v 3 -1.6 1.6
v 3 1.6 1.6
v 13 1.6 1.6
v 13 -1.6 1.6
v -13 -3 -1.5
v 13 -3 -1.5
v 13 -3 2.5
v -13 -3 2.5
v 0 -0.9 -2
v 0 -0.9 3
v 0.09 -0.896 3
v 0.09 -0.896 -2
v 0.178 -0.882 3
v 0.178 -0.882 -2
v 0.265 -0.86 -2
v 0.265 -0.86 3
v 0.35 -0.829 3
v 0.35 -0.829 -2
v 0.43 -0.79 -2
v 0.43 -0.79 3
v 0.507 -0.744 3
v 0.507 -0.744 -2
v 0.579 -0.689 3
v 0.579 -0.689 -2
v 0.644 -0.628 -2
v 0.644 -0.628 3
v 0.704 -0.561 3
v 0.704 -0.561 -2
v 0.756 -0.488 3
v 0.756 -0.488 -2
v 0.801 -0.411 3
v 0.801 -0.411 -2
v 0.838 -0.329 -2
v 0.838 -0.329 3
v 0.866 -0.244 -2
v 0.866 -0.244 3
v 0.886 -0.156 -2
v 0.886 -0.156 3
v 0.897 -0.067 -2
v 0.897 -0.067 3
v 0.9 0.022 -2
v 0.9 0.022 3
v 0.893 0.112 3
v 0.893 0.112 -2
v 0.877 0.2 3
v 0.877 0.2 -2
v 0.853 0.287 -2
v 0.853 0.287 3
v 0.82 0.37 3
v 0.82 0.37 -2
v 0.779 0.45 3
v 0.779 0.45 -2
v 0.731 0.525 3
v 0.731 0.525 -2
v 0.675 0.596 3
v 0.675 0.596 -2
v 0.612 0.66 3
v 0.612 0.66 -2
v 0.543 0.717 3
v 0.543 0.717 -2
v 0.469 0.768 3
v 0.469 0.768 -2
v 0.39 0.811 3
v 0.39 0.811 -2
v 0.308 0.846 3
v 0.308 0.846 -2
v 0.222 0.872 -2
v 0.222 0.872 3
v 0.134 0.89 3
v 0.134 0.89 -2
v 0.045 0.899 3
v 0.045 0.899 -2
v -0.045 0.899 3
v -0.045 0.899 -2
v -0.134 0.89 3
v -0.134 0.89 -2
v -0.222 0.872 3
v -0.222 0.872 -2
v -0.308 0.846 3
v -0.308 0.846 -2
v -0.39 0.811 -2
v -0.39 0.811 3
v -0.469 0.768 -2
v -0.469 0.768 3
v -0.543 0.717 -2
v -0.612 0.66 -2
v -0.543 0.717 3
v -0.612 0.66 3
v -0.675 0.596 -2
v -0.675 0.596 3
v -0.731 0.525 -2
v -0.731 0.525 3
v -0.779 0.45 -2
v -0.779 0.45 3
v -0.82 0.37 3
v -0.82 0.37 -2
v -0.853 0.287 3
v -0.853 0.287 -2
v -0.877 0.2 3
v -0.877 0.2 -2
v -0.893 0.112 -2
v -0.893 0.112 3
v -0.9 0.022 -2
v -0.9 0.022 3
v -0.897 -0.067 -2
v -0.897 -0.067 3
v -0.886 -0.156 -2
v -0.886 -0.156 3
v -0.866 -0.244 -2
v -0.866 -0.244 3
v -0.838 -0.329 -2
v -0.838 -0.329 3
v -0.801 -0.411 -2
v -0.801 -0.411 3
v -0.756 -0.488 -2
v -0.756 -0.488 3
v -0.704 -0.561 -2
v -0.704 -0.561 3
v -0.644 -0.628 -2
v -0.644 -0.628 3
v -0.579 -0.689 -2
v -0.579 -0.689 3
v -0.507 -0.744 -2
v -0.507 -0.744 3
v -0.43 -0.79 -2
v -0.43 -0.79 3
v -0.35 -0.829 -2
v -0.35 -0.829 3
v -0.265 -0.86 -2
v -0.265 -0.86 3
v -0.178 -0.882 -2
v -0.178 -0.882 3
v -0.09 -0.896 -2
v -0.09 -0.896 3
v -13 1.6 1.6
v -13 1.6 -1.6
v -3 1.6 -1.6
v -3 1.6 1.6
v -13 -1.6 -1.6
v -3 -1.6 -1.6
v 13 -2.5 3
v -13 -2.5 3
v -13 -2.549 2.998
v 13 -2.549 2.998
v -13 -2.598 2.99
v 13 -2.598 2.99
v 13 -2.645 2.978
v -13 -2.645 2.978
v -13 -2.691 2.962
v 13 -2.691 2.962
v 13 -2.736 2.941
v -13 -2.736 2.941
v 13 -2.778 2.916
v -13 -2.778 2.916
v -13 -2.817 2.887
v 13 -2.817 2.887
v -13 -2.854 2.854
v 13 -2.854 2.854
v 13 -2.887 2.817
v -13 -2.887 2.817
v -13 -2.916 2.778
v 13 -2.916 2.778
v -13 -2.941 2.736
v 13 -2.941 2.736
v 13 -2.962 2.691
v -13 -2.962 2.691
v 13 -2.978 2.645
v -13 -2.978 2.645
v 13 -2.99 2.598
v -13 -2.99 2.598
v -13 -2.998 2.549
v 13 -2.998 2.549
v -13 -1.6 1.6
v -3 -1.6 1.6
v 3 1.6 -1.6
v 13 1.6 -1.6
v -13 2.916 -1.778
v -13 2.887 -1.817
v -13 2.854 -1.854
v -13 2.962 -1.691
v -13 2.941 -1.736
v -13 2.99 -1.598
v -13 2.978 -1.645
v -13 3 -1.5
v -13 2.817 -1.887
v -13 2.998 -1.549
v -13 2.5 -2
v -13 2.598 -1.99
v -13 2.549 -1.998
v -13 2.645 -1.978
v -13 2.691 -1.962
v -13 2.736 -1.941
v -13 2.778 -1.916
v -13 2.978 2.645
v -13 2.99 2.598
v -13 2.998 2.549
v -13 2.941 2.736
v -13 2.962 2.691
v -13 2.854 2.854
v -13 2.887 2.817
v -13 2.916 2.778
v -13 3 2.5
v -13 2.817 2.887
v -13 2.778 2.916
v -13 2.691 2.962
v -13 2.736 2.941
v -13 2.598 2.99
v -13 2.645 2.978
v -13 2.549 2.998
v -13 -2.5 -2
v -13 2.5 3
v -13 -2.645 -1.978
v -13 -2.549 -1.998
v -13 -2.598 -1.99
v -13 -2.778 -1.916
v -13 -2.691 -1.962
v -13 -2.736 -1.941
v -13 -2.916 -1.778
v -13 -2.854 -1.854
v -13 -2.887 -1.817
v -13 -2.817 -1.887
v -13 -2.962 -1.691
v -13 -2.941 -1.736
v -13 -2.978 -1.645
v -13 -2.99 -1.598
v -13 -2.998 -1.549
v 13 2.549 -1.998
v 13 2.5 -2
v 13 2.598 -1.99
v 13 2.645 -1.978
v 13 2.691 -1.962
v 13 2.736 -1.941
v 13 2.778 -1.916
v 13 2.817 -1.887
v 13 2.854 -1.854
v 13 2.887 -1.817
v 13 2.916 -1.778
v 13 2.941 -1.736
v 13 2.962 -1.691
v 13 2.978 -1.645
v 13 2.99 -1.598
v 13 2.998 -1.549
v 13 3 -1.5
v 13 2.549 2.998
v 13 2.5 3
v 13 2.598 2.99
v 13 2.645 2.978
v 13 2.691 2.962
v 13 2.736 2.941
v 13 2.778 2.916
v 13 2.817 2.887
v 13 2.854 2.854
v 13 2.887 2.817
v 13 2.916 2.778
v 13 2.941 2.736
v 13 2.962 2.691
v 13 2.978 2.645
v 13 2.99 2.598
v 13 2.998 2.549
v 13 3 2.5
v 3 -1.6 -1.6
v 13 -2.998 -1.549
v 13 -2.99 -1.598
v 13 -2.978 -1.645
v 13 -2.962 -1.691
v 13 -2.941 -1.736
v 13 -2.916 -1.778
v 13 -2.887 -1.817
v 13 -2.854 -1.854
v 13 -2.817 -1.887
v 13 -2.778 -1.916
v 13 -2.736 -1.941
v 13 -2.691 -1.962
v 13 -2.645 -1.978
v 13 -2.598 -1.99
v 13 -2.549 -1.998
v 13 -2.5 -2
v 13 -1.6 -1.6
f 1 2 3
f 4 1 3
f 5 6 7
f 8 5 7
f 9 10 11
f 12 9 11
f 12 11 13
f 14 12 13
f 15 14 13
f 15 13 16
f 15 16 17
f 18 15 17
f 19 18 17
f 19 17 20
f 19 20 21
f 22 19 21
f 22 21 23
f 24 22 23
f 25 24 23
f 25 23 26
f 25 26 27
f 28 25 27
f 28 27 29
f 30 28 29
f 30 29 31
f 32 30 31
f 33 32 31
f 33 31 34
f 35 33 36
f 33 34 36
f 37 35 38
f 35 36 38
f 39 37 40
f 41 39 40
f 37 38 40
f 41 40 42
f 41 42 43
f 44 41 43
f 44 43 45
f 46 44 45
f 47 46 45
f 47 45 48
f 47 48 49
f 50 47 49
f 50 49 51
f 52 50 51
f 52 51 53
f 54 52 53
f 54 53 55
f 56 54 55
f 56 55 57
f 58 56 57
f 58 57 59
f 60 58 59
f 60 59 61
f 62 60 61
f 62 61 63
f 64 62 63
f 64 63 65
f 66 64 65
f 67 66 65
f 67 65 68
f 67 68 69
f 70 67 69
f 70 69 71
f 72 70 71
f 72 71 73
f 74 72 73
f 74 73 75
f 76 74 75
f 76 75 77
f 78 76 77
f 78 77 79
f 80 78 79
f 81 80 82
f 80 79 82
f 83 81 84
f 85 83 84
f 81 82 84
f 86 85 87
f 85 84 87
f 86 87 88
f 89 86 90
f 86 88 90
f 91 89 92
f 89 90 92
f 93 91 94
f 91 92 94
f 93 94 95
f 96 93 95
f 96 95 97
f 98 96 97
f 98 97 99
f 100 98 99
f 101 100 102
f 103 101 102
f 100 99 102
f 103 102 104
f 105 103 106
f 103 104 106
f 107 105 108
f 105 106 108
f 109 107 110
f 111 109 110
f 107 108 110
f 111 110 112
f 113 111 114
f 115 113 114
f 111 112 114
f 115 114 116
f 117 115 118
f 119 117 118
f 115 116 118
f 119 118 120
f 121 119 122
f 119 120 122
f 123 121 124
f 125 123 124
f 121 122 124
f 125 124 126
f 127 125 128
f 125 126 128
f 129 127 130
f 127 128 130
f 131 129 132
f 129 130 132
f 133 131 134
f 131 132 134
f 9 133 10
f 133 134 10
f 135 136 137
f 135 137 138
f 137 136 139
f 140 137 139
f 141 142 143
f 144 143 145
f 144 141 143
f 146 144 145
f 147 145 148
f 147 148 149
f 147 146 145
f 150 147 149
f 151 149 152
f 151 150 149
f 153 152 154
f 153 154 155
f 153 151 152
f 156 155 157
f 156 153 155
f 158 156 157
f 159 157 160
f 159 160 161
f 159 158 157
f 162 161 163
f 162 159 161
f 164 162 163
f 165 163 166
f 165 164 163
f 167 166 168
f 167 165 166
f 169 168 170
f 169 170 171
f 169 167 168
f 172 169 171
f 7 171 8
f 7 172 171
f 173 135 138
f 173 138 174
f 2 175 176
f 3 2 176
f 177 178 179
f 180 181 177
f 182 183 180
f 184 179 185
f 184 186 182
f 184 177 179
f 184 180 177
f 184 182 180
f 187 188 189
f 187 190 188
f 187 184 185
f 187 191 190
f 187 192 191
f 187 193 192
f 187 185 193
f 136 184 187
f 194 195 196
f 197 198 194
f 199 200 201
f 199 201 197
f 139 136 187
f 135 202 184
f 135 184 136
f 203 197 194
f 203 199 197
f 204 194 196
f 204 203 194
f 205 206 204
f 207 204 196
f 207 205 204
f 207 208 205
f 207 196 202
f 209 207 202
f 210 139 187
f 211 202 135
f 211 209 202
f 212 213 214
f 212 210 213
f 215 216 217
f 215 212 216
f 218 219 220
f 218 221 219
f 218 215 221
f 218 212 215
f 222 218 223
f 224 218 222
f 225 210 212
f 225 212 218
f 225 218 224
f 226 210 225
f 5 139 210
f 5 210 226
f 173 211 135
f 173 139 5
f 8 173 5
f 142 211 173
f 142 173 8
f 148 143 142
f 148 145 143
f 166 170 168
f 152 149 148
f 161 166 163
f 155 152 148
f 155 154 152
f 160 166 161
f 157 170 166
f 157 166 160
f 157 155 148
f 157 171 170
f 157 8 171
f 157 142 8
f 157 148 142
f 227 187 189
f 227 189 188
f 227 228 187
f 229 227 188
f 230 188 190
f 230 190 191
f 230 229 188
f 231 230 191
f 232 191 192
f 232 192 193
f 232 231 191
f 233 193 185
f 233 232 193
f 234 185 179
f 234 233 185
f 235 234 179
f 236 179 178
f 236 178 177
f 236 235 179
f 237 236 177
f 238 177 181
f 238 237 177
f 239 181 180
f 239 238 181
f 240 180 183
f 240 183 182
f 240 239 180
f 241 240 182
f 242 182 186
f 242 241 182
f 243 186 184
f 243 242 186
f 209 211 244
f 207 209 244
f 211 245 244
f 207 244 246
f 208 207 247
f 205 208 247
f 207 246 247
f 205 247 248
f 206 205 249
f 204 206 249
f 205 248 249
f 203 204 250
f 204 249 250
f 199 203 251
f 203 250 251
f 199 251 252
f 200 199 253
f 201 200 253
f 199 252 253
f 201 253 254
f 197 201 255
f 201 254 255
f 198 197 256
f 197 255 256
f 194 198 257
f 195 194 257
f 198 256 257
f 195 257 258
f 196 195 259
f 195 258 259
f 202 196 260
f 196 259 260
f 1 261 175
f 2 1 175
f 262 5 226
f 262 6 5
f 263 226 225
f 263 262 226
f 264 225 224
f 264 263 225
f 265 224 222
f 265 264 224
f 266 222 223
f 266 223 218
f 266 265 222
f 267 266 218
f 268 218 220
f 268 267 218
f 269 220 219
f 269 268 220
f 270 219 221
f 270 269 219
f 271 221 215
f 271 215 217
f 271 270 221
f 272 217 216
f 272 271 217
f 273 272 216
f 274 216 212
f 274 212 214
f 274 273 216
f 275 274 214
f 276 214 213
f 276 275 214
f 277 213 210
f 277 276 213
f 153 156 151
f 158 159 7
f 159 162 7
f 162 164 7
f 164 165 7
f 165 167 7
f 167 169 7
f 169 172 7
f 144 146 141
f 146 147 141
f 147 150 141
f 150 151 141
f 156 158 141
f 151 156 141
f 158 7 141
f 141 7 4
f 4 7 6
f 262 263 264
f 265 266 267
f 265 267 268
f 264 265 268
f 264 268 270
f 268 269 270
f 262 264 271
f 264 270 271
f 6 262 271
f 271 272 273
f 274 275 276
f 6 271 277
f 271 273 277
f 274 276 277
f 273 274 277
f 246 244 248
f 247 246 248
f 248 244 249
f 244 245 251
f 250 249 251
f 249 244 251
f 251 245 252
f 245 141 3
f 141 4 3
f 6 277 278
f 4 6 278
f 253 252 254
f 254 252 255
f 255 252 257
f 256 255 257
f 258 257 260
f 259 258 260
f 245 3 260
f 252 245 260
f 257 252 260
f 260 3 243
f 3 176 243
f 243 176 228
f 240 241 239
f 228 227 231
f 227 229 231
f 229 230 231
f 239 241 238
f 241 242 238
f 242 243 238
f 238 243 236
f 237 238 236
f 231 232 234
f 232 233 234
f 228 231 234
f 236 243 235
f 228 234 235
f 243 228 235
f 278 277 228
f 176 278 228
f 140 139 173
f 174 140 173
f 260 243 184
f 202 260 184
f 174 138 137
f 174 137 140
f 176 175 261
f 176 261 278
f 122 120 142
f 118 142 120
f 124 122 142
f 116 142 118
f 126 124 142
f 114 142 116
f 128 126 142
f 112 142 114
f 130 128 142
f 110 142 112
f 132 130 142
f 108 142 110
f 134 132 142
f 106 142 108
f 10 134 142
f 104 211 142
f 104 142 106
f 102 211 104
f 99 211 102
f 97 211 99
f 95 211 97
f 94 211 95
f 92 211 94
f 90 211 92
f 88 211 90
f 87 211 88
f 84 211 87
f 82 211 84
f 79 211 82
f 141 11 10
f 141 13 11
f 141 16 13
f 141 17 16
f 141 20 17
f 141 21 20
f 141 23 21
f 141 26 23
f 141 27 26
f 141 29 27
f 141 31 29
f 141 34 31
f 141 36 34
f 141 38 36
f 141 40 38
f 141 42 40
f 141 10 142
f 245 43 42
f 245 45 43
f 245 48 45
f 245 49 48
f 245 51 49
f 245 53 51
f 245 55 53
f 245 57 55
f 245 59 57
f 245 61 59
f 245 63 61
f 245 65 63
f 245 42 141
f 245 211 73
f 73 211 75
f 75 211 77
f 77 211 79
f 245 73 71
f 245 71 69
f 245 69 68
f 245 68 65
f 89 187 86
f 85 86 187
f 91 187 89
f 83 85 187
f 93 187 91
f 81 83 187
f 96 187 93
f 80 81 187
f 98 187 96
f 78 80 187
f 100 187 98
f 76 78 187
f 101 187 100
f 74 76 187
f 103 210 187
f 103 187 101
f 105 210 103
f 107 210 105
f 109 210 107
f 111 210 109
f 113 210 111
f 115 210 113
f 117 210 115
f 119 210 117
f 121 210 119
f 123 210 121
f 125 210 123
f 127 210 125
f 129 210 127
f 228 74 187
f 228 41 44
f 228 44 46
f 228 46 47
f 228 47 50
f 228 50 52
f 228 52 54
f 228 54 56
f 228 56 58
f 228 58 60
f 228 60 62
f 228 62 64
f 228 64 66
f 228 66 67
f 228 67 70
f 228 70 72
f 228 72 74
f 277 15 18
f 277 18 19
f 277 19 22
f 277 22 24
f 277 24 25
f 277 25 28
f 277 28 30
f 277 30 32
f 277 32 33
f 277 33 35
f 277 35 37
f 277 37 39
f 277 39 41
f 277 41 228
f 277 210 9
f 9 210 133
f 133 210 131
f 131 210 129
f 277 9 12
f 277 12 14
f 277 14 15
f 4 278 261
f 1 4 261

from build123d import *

# Parameters (mm, degrees)
SKETCH3_R             = 3
BOSS_EXTRUDE1_DEPTH   = 6
BOSS_EXTRUDE2_START   = -3
SKETCH4_W             = 6
SKETCH4_H             = 6
BOSS_EXTRUDE2_DEPTH   = 13
SKETCH5_W             = 3.2
SKETCH5_H             = 3.2
CUT_EXTRUDE1_DEPTH    = 10
SKETCH6_R             = 0.9
CUT_EXTRUDE2_DEPTH    = 15.628738838
MIRROR2_DEPTH         = 6
MIRROR2_2_OUTLINE_W   = 10
MIRROR2_2_OUTLINE_H   = 3.2
MIRROR2_2_DEPTH       = 1.4
MIRROR2_START         = 4.6
MIRROR2_3_OUTLINE_W   = 10
MIRROR2_3_OUTLINE_H   = 3.2
MIRROR2_3_DEPTH       = 1.4
SKETCH8_W             = 26
SKETCH8_H             = 6
CUT_EXTRUDE3_DEPTH    = 1
FILLET1_R             = 0.5
BODY_MOVE_COPY1_ANGLE = 90


with BuildPart() as part:
    # Sketch3 → Boss-Extrude1 (new body)
    with BuildSketch(Plane(origin=(0, 0, 0), x_dir=(1, 0, 0), z_dir=(0, 1, 0))):
        with Locations(Location((0, 0, 0), (0, 0, 270))):
            Circle(SKETCH3_R)
    extrude(amount=BOSS_EXTRUDE1_DEPTH)

    # Sketch4 → Boss-Extrude2 (add)
    with BuildSketch(Plane.ZY.offset(3).offset(BOSS_EXTRUDE2_START)):
        with Locations((0, 3)):
            Rectangle(SKETCH4_W, SKETCH4_H)
    extrude(amount=BOSS_EXTRUDE2_DEPTH)

    # Sketch5 → Cut-Extrude1 (cut)
    with BuildSketch(Plane.ZY.offset(13)):
        with Locations((0, 3)):
            Rectangle(SKETCH5_W, SKETCH5_H)
    extrude(amount=-CUT_EXTRUDE1_DEPTH, mode=Mode.SUBTRACT)

    # Sketch6 → Cut-Extrude2 (cut, through all)
    with BuildSketch(Plane(origin=(0, 6, 0), x_dir=(1, 0, 0), z_dir=(0, 1, 0))):
        with Locations(Location((0, 0, 0), (0, 0, 270))):
            Circle(SKETCH6_R)
    extrude(amount=-CUT_EXTRUDE2_DEPTH, mode=Mode.SUBTRACT)

    # Mirror2: read off the stored shape, not the designer's step
    # Mirror2 outline → Mirror2 (add)
    with BuildSketch(Plane(origin=(0, 0, 0), x_dir=(1, 0, 0), z_dir=(0, 1, 0))):
        with BuildLine():
            Line((13, 1.6), (13, 3))
            Line((13, 3), (0, 3))
            ThreePointArc((0, 3), (2.121320344, 2.121320344), (3, 0))
            Line((3, 0), (3, 1.6))
            Line((3, 1.6), (13, 1.6))
        make_face()
        with BuildLine():
            Line((13, -3), (13, -1.6))
            Line((13, -1.6), (3, -1.6))
            Line((3, -1.6), (3, 0))
            ThreePointArc((3, 0), (2.121320344, -2.121320344), (0, -3))
            Line((0, -3), (13, -3))
        make_face()
    extrude(amount=MIRROR2_DEPTH)

    # Mirror2 2 outline → Mirror2 2 (add)
    with BuildSketch(Plane(origin=(0, 0, 0), x_dir=(1, 0, 0), z_dir=(0, 1, 0))):
        with Locations((8, 0)):
            Rectangle(MIRROR2_2_OUTLINE_W, MIRROR2_2_OUTLINE_H)
    extrude(amount=MIRROR2_2_DEPTH)

    # Mirror2 3 outline → Mirror2 3 (add)
    with BuildSketch(Plane(origin=(0, 0, 0), x_dir=(1, 0, 0), z_dir=(0, 1, 0)).offset(MIRROR2_START)):
        with Locations((8, 0)):
            Rectangle(MIRROR2_3_OUTLINE_W, MIRROR2_3_OUTLINE_H)
    extrude(amount=MIRROR2_3_DEPTH)

    # Sketch8 → Cut-Extrude3 (cut)
    with BuildSketch(Plane.XZ):
        Rectangle(SKETCH8_W, SKETCH8_H)
    extrude(amount=-CUT_EXTRUDE3_DEPTH, mode=Mode.SUBTRACT)

    # Fillet1
    fillet1_edges = [part.edges().sort_by_distance(p)[0] for p in [
        (0, 1, 3),
        (0, 1, -3),
        (0, 6, 3),
        (0, 6, -3),
    ]]
    fillet(fillet1_edges, radius=FILLET1_R)


with BuildPart() as part_1:
    # Body-Move/Copy1: moved
    add(part.part.rotate(Axis((0, 3.5, 0), (1, 0, 0)), BODY_MOVE_COPY1_ANGLE))


with BuildPart() as part_2:
    # Body-Move/Copy2: read off the stored shape, not the designer's step
    # Body-Move/Copy2: moved
    add(part_1.part.moved(Location((0, -3.5, 0.5))))


solid = part_2.part
